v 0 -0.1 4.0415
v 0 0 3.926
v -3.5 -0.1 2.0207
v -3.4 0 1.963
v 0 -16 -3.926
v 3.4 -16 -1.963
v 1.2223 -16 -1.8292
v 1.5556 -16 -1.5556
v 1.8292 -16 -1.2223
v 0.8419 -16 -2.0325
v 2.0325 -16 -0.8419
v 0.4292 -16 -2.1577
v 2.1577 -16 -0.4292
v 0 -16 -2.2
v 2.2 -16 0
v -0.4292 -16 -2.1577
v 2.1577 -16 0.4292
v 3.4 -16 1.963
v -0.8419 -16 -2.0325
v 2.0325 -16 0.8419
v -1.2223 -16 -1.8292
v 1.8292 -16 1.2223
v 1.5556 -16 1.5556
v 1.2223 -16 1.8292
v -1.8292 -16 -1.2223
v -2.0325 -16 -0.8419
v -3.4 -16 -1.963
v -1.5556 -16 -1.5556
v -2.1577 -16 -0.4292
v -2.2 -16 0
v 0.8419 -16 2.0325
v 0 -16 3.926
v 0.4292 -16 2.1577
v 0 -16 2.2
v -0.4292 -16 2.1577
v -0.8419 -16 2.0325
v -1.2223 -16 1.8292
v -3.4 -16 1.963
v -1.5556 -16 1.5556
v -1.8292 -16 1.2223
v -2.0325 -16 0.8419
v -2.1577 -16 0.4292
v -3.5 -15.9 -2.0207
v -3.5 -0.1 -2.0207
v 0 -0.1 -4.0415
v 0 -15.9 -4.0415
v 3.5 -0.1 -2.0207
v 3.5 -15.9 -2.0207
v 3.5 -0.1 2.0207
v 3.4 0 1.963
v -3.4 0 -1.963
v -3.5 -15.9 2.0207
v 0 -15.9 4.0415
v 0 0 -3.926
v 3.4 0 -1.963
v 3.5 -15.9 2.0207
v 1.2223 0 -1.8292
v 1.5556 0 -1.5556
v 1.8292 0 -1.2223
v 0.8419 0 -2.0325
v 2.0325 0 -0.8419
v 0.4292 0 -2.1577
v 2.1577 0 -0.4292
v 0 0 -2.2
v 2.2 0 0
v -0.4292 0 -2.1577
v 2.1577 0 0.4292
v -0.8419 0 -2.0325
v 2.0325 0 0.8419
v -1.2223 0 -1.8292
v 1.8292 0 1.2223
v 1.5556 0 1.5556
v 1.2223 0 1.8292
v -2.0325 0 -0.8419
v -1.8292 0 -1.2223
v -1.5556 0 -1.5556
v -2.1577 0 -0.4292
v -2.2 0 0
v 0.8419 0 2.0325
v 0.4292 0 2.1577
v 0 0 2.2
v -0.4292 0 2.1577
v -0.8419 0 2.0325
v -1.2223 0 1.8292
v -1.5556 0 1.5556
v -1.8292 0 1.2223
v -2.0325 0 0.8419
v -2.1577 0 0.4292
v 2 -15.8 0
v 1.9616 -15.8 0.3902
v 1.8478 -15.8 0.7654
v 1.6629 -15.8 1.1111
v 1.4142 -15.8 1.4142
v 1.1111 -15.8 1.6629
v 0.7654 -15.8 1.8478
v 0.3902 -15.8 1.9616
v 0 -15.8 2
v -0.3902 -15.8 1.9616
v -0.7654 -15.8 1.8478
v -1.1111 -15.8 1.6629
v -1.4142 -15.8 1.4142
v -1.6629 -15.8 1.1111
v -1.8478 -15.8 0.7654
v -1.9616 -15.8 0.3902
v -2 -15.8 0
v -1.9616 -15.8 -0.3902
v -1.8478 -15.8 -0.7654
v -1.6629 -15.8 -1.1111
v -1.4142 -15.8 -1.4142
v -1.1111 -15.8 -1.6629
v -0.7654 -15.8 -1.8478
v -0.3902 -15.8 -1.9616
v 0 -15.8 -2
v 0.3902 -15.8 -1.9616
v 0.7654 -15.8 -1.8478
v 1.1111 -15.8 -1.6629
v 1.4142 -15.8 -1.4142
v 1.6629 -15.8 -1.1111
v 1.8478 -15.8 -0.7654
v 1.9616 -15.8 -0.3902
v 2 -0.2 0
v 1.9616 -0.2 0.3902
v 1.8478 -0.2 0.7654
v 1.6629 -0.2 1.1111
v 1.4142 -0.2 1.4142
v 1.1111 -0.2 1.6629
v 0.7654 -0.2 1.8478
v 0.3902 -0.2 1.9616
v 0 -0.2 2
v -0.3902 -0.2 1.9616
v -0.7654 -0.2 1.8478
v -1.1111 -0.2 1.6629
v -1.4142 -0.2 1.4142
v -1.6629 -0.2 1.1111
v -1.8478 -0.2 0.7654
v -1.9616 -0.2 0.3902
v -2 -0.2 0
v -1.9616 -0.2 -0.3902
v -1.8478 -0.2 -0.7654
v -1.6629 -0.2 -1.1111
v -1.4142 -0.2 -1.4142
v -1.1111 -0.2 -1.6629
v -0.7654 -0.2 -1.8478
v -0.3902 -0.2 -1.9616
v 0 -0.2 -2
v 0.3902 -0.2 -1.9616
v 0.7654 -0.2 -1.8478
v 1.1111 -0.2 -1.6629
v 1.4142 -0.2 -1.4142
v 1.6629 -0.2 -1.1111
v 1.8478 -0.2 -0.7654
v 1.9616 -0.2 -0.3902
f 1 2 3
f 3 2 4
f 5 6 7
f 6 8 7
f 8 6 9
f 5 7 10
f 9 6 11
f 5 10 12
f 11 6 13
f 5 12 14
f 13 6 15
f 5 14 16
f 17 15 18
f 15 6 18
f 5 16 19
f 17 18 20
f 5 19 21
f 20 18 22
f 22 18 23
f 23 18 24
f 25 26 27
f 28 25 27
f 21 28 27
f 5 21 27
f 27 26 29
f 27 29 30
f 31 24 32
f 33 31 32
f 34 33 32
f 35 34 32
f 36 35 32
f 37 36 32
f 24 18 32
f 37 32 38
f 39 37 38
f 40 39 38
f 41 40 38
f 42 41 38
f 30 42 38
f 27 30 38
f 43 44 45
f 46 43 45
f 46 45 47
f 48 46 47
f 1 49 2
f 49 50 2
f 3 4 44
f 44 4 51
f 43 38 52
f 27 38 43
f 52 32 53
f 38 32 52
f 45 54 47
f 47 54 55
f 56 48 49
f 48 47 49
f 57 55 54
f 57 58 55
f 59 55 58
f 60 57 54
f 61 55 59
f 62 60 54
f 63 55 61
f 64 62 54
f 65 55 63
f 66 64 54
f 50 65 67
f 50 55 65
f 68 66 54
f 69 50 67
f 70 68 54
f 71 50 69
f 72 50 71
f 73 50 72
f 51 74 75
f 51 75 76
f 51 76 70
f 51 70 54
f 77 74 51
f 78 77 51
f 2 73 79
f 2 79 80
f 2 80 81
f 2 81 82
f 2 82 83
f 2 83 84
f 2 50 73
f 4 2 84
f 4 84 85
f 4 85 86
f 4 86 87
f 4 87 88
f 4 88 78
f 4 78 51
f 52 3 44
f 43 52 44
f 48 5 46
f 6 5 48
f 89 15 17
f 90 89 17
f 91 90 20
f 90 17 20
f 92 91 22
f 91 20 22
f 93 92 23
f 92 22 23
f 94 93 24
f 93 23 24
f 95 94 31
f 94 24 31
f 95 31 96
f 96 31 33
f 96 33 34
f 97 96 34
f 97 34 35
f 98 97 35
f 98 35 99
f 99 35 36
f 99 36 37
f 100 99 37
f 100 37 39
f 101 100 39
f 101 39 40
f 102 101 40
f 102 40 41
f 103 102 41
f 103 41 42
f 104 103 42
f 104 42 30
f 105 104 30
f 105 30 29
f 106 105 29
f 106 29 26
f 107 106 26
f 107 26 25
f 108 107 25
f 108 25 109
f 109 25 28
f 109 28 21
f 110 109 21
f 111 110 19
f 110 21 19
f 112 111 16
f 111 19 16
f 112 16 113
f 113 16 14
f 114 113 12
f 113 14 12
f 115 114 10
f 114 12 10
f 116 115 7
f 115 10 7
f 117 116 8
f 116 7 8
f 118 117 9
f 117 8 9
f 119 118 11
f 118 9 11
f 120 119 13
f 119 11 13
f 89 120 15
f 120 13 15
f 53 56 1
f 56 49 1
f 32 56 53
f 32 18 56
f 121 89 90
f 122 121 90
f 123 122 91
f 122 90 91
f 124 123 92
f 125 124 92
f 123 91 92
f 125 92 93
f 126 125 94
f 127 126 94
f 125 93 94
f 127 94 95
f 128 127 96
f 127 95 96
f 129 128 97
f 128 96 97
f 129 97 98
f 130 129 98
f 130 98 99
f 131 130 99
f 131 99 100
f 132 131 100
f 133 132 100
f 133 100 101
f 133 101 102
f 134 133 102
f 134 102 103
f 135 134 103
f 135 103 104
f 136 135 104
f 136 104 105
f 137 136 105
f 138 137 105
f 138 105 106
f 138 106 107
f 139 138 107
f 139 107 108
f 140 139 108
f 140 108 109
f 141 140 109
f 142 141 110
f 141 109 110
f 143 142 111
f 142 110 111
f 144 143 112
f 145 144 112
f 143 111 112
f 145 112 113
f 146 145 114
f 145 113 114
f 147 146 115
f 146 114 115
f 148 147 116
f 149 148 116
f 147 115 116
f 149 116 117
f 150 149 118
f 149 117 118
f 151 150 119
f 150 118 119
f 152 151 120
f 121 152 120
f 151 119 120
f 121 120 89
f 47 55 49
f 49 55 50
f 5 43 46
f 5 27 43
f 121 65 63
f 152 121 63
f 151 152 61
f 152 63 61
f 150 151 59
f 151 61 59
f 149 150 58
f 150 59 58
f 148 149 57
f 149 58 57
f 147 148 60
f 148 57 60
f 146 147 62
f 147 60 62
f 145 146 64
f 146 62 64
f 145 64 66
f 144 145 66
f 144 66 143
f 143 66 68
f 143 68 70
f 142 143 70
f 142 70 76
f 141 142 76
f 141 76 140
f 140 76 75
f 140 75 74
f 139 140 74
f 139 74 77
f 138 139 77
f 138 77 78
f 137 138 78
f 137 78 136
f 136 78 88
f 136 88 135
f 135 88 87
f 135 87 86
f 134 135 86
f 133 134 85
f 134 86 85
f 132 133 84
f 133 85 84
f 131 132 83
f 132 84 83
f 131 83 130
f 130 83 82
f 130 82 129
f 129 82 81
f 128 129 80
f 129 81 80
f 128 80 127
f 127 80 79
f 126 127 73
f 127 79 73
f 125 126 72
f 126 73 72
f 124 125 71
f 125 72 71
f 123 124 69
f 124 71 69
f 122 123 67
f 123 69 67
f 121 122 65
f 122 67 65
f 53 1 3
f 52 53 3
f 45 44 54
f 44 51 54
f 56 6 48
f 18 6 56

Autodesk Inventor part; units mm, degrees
ref_plane "YZ Plane" through (0, 0, 0) normal (1, 0, 0) x (0, 1, 0)
ref_plane "XZ Plane" through (0, 0, 0) normal (0, 1, 0) x (-1, 0, 0)
ref_plane "XY Plane" through (0, 0, 0) normal (0, 0, 1) x (1, 0, 0)
sketch "Sketch1" plane through (0, 0, 0) normal (0, 1, 0) x (-1, 0, 0)
  line L0 (-3.5, -2.0207) -> (-3.5, 2.0207)
  line L1 (-3.5, 2.0207) -> (0, 4.0415)
  line L2 (0, 4.0415) -> (3.5, 2.0207)
  line L3 (3.5, 2.0207) -> (3.5, -2.0207)
  line L4 (3.5, -2.0207) -> (0, -4.0415)
  line L5 (0, -4.0415) -> (-3.5, -2.0207)
  point P0 (0, 0)
  point P1 (0, 0)
  dimension "d0" = 7
extrude "Extrusion1" add sketch "Sketch1" against normal blind 16
chamfer "Chamfer1" distance 0.1 angle 45 12 edges at (-1.75, -16, 3.0311) (1.75, -16, 3.0311) (3.5, -16, 0) (1.75, -16, -3.0311) (-1.75, -16, -3.0311) (-3.5, -16, 0) (1.75, 0, 3.0311) (-1.75, 0, 3.0311) (-3.5, 0, 0) (-1.75, 0, -3.0311) (1.75, 0, -3.0311) (3.5, 0, 0)
sketch "Sketch2" plane through (0, -16, 0) normal (0, -1, 0) x (1, 0, 0)
  circle A0 centre (0, 0) radius 2
  dimension "d6" = 4
extrude "Extrusion2" cut sketch "Sketch2" against normal through all
chamfer "Chamfer2" distance 0.2 angle 45 2 edges at (-2, -16, 0) (-2, 0, 0)
thread "Thread1" size "M4x0.7" class "6H" standard "ANSI Metric M Profile" full length
properties part number "09-0003" material "Aluminum 6061"
